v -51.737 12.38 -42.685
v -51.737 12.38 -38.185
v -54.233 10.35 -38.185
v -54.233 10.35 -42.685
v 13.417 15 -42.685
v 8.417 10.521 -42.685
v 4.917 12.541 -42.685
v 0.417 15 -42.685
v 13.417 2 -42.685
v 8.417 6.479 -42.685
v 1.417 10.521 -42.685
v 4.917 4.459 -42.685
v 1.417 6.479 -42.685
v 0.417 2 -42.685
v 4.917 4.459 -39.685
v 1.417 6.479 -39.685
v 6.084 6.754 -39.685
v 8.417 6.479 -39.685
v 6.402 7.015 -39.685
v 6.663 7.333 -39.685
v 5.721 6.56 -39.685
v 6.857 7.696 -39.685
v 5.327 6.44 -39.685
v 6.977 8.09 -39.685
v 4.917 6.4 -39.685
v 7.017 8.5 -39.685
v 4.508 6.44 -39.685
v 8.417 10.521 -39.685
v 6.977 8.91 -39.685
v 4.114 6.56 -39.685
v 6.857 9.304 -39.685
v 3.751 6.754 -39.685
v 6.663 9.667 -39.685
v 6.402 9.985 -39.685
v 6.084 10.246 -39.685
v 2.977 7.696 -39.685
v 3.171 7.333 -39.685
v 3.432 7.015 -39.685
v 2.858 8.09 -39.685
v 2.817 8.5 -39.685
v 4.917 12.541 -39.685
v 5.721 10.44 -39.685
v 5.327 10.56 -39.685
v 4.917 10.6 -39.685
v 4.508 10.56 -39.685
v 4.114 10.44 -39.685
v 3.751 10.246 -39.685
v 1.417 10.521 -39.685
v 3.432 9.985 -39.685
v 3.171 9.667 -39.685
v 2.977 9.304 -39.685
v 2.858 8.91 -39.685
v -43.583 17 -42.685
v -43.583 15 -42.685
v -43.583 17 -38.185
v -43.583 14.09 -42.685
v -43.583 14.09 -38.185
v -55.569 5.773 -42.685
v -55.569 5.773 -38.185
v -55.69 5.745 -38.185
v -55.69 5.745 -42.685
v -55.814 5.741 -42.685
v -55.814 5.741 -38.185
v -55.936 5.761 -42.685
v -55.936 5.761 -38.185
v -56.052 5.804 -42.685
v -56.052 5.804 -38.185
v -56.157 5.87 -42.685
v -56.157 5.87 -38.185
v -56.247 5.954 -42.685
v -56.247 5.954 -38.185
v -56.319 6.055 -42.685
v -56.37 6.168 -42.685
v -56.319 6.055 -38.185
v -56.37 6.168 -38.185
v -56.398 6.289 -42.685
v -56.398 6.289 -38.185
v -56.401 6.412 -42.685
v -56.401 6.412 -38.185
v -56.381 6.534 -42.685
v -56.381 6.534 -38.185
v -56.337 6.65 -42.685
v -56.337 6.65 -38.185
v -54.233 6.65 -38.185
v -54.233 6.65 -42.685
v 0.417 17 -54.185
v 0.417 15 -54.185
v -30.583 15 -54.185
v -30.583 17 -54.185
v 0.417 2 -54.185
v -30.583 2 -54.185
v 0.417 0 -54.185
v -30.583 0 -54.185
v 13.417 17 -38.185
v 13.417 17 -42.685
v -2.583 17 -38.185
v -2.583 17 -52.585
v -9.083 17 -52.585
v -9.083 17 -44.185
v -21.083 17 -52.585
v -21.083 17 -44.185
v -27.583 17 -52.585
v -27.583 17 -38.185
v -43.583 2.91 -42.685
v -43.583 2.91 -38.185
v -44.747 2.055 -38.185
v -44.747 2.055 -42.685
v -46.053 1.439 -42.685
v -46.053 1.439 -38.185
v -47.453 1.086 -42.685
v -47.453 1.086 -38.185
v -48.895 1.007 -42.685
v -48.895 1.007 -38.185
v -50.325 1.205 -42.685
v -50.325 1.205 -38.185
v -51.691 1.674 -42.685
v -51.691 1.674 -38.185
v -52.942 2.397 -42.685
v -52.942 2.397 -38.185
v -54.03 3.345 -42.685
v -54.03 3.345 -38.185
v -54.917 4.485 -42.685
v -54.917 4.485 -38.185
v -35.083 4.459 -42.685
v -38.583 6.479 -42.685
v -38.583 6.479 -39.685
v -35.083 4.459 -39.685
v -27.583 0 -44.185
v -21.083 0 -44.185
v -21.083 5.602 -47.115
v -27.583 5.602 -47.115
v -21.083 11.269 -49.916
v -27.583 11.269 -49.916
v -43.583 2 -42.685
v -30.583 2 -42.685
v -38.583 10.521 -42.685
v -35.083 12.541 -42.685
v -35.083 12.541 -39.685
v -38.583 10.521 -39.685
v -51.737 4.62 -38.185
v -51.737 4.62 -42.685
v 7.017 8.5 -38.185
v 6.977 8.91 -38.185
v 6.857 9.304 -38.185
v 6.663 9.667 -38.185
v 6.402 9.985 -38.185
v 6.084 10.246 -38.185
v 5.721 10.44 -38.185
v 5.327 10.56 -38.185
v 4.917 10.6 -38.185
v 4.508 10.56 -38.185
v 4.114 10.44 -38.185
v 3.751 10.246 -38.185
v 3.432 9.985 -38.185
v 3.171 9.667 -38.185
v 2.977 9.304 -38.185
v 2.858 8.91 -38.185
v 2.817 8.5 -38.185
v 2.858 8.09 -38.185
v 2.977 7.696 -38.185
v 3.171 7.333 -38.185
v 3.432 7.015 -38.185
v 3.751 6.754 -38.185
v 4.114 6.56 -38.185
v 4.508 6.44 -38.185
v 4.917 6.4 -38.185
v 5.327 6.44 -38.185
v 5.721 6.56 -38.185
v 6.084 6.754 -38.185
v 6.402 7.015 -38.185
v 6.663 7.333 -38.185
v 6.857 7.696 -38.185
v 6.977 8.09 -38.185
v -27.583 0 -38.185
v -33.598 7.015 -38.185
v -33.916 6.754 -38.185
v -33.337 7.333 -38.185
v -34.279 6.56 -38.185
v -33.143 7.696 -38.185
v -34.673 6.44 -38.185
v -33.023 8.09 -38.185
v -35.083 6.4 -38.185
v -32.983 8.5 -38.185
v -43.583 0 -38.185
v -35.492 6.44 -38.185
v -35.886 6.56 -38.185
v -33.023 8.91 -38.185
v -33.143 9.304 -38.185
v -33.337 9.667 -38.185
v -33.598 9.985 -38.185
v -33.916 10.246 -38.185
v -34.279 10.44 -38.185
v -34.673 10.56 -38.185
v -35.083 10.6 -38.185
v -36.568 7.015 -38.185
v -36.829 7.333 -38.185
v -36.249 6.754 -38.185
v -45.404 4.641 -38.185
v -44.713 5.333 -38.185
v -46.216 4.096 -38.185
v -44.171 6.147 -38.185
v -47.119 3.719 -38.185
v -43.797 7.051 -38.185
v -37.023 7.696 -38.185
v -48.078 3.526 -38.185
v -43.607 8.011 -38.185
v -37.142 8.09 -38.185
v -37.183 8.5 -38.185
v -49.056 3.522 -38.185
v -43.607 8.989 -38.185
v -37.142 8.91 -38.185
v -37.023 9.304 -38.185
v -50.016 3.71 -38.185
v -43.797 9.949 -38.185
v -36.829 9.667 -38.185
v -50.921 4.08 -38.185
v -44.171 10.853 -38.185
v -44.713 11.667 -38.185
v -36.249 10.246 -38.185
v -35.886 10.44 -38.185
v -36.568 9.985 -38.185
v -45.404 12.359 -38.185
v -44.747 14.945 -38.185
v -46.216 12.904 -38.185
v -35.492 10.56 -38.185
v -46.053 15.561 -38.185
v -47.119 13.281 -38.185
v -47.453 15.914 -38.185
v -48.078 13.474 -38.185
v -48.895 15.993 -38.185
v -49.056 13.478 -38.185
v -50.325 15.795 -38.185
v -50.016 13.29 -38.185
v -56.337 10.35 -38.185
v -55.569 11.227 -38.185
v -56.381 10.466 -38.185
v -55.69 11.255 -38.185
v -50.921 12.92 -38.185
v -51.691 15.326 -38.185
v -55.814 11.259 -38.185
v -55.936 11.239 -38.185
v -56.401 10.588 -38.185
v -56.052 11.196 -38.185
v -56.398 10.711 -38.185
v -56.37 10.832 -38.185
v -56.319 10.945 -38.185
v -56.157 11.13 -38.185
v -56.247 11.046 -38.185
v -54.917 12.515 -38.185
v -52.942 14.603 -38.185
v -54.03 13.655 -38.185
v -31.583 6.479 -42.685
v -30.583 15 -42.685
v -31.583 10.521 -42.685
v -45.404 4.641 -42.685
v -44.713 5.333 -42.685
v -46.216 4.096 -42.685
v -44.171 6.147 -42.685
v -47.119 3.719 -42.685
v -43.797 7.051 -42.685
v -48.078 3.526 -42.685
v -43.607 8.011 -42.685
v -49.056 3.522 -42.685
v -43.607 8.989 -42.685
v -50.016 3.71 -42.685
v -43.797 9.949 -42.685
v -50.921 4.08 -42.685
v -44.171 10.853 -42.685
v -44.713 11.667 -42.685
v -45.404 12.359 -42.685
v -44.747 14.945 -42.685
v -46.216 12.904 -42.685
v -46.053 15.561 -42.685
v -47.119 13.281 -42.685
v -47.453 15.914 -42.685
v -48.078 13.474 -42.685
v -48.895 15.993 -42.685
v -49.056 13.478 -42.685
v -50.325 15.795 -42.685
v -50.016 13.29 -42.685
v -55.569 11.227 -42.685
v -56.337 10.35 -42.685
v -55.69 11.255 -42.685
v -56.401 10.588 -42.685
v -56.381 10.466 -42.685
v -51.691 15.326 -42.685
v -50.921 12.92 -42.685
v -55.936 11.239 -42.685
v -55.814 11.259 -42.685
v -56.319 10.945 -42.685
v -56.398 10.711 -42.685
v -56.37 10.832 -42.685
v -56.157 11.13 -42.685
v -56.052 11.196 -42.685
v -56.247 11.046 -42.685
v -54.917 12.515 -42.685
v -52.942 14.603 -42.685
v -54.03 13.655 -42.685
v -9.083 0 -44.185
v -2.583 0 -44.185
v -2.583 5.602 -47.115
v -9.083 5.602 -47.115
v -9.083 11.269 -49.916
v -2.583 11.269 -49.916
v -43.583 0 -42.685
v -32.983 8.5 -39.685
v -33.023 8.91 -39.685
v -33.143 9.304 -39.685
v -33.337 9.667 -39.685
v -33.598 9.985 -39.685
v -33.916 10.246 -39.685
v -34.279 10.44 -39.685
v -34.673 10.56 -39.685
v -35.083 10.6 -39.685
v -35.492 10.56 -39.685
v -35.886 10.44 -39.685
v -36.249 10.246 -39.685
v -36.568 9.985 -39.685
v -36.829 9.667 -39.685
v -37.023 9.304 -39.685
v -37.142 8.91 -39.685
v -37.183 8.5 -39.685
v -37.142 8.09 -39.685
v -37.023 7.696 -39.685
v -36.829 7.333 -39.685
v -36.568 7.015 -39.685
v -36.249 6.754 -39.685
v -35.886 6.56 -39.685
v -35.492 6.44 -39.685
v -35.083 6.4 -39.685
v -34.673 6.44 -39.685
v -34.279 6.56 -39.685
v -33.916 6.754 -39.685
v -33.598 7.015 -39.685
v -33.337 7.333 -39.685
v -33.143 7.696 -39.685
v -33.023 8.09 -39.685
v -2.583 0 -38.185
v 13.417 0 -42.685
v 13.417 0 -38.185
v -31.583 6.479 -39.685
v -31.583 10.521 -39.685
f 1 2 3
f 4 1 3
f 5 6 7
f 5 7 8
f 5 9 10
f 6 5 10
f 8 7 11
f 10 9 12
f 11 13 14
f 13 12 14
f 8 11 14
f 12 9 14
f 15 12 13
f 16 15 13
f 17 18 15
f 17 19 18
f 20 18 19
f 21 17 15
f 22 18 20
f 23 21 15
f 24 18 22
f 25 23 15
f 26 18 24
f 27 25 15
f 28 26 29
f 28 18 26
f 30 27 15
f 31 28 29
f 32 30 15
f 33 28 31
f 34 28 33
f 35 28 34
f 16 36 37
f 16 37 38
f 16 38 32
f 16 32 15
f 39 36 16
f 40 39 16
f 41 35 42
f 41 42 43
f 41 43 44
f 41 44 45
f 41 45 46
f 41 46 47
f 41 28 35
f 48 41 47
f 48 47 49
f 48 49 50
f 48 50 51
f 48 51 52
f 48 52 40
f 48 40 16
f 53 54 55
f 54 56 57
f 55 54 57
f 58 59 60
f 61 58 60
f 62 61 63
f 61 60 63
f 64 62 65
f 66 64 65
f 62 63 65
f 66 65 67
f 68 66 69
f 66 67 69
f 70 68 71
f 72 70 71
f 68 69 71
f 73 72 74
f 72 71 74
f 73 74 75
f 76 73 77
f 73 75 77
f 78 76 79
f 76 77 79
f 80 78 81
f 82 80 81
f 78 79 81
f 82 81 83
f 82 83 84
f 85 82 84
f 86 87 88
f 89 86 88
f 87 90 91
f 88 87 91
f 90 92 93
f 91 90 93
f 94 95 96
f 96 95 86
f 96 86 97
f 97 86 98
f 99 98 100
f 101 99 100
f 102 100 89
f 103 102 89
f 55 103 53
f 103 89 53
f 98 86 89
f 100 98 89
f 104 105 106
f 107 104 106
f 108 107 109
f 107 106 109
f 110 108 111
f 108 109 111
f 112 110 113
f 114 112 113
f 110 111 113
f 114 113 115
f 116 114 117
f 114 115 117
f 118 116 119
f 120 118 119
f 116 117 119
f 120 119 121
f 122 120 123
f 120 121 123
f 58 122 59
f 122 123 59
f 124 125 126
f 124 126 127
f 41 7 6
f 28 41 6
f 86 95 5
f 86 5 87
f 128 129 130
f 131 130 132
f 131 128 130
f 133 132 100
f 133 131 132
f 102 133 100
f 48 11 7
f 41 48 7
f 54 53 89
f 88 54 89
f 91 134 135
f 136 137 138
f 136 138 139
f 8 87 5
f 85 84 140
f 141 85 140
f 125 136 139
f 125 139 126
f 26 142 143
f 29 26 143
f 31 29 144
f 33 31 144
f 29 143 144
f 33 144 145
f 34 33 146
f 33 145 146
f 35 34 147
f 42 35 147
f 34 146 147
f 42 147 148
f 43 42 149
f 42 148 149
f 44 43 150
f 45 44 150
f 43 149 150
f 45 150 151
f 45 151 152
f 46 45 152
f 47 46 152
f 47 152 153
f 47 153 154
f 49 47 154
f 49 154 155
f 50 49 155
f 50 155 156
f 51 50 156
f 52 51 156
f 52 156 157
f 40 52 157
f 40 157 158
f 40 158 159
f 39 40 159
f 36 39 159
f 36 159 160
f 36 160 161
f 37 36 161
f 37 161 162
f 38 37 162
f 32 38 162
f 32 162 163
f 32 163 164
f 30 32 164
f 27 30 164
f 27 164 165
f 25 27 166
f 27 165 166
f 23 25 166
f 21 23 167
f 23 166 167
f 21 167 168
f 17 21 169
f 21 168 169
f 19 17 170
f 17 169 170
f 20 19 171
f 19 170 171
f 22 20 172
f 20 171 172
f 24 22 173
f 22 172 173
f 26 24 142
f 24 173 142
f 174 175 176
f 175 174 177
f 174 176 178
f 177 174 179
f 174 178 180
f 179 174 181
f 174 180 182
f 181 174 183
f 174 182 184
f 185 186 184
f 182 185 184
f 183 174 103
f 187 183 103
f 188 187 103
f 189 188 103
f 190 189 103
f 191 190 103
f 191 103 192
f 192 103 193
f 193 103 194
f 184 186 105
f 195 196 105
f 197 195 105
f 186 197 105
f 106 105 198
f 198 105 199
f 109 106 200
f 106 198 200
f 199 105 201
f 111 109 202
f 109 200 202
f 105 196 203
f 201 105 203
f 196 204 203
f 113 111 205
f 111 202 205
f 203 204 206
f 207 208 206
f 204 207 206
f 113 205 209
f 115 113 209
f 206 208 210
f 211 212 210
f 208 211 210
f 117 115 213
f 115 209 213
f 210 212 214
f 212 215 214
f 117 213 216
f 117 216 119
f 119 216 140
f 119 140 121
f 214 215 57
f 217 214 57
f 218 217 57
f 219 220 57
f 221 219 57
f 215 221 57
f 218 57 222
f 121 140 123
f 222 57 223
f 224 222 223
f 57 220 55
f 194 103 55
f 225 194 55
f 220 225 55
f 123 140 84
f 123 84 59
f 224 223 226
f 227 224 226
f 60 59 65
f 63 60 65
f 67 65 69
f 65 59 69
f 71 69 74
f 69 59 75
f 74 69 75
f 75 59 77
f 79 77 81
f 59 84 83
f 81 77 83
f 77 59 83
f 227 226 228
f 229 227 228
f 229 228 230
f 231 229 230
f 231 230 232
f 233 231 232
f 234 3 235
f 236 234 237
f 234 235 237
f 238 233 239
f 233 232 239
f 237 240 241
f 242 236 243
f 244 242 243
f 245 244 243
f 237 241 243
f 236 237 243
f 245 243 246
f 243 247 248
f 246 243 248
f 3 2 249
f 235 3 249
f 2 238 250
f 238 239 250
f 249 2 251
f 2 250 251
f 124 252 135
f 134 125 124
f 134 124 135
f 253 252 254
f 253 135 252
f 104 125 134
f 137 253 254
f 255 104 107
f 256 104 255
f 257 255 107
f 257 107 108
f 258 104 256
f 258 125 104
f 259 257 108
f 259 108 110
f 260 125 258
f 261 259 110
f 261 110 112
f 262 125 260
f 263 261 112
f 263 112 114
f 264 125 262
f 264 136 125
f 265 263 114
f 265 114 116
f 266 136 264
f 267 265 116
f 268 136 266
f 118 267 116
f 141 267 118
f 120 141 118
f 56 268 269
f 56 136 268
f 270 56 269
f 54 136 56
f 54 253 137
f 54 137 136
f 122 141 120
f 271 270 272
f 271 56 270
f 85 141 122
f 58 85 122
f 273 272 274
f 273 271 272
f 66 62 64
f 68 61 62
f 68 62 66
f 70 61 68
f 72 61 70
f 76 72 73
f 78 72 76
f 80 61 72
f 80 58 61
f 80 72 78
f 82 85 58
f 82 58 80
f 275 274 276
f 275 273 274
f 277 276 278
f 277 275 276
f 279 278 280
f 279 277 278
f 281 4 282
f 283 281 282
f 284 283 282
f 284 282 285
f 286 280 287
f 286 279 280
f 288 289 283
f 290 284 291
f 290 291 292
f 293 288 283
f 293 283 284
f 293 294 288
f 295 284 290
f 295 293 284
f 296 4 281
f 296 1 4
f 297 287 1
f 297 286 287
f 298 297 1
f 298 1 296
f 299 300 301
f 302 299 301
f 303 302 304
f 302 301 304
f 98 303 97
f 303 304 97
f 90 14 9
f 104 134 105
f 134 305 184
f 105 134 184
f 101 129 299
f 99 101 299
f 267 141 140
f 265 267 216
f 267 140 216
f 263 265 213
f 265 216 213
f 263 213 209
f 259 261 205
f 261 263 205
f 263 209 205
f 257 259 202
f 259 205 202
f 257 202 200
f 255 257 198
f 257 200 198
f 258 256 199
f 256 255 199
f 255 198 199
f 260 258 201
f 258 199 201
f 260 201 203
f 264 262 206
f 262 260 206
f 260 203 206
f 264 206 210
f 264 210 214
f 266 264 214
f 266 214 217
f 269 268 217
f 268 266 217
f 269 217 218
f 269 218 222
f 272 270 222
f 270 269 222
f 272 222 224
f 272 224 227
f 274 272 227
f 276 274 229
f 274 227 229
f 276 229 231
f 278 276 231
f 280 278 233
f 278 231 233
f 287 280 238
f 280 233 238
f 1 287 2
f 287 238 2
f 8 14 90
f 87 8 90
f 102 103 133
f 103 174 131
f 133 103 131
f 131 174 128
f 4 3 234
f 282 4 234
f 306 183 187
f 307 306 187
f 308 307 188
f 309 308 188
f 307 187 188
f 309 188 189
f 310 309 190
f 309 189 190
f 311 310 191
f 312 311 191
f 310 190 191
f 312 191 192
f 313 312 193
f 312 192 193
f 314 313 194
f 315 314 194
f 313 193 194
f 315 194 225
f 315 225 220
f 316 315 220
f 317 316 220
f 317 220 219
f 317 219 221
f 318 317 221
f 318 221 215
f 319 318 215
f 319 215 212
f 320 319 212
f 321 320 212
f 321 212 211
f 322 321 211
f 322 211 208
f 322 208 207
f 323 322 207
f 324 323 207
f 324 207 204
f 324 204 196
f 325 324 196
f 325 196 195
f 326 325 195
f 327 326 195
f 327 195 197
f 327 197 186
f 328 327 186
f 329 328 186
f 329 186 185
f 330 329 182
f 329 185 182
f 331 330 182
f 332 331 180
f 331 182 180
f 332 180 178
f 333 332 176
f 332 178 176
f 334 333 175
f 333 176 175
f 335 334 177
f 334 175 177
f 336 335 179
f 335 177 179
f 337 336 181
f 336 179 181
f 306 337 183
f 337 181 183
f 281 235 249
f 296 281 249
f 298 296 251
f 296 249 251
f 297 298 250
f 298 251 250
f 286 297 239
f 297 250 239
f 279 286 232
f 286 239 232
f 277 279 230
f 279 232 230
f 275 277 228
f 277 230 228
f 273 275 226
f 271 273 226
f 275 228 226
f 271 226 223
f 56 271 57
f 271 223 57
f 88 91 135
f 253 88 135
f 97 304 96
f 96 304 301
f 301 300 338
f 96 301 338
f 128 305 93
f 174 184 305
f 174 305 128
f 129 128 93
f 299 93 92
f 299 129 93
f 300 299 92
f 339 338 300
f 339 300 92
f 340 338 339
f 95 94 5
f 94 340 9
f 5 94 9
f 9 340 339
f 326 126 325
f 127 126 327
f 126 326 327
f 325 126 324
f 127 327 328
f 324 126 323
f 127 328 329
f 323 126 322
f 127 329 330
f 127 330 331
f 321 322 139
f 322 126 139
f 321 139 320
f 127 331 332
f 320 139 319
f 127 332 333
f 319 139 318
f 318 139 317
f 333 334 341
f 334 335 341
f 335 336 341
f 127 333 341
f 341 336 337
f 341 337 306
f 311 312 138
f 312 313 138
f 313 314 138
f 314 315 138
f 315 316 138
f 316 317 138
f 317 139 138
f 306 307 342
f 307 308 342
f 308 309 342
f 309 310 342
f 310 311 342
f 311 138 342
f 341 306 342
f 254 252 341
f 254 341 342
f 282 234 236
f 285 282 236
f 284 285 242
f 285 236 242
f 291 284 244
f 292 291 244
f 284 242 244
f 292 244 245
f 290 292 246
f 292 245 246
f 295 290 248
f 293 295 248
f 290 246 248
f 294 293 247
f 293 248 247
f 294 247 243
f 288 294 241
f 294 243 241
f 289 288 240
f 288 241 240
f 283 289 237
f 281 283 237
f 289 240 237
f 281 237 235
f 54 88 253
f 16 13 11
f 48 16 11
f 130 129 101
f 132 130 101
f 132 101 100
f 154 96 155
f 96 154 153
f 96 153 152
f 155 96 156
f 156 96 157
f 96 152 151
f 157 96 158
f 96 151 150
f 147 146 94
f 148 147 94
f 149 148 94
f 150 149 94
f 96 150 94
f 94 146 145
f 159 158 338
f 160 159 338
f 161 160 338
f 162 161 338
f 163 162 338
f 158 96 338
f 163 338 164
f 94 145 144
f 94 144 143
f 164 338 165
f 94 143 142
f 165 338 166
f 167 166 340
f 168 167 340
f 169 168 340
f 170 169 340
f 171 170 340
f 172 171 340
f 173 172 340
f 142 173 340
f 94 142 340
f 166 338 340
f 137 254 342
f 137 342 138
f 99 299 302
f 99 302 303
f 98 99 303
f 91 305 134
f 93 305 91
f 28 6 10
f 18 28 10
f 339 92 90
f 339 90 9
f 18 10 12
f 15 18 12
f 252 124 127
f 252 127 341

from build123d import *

# Parameters (mm, degrees)
BOSS_EXTRUDE1_DEPTH = 17
BOSS_EXTRUDE2_DEPTH = 2
BOSS_EXTRUDE3_DEPTH = 2
SKETCH4_R           = 2.1
CUT_EXTRUDE1_DEPTH  = 100
CUT_EXTRUDE2_DEPTH  = 3
CUT_EXTRUDE3_DEPTH  = 6.5
CUT_EXTRUDE4_DEPTH  = 6.5
BOSS_EXTRUDE4_DEPTH = 4.5


with BuildPart() as part:
    # Sketch1 → Boss-Extrude1 (new body)
    with BuildSketch(Plane(origin=(0, 0, 0), x_dir=(1, 0, 0), z_dir=(0, 1, 0))):
        Polygon((-27.582659514, 44.185105583), (-2.582659514, 44.185105583), (-2.582659514, 38.185105583), (13.417340486, 38.185105583), (13.417340486, 42.685105583), (0.417340486, 42.685105583), (0.417340486, 54.185105583), (-30.582659514, 54.185105583), (-30.582659514, 42.685105583), (-43.582659514, 42.685105583), (-43.582659514, 38.185105583), (-27.582659514, 38.185105583), align=None)
    extrude(amount=BOSS_EXTRUDE1_DEPTH)

    # Sketch2 → Boss-Extrude2 (add)
    with BuildSketch(Plane(origin=(0, 17, 0), x_dir=(1, 0, 0), z_dir=(0, 1, 0))):
        Polygon((-43.582659514, 42.685105583), (-30.582659514, 54.185105583), (-30.582659514, 42.685105583), align=None)
        Polygon((0.417340486, 42.685105583), (13.417340486, 42.685105583), (0.417340486, 54.185105583), align=None)
    extrude(amount=-BOSS_EXTRUDE2_DEPTH)

    # Sketch3 → Boss-Extrude3 (add)
    with BuildSketch(Plane.XZ):
        Polygon((-43.582659514, -42.685105583), (-30.582659514, -54.185105583), (-30.582659514, -42.685105583), align=None)
        Polygon((0.417340486, -42.685105583), (0.417340486, -54.185105583), (13.417340486, -42.685105583), align=None)
    extrude(amount=-BOSS_EXTRUDE3_DEPTH)

    # Sketch4 → Cut-Extrude1 (cut)
    with BuildSketch(Plane.XY.offset(-38.185105583)):
        with Locations((-35.082659514, 8.5)):
            Circle(SKETCH4_R)
        with Locations((4.917340486, 8.5)):
            Circle(SKETCH4_R)
    extrude(amount=-CUT_EXTRUDE1_DEPTH, mode=Mode.SUBTRACT)

    # Sketch5 → Cut-Extrude2 (cut)
    with BuildSketch(Plane(origin=(0, 0, -42.685105583), x_dir=(-1, 0, 0), z_dir=(0, 0, -1))):
        Polygon((31.582659514, 6.479274058), (31.582659514, 10.520725942), (35.082659514, 12.541451884), (38.582659514, 10.520725942), (38.582659514, 6.479274058), (35.082659514, 4.458548116), align=None)
        Polygon((-1.417340486, 10.520725942), (-4.917340486, 12.541451884), (-8.417340486, 10.520725942), (-8.417340486, 6.479274058), (-4.917340486, 4.458548116), (-1.417340486, 6.479274058), align=None)
    extrude(amount=-CUT_EXTRUDE2_DEPTH, mode=Mode.SUBTRACT)

    # Sketch7 → Cut-Extrude3 (cut)
    with BuildSketch(Plane.ZY.offset(2.582659514)):
        with BuildLine():
            Line((-53.601964627, 19.27795803), (-35.36636136, 18.147314128))
            Line((-35.36636136, 18.147314128), (-35.36636136, -6.291096758))
            Line((-35.36636136, -6.291096758), (-39.347618514, -8.620327672))
            ThreePointArc((-39.347618514, -8.620327672), (-46.872397507, 5.125662458), (-53.601964627, 19.27795803))
        make_face()
    extrude(amount=CUT_EXTRUDE3_DEPTH, mode=Mode.SUBTRACT)

    # Sketch8 → Cut-Extrude4 (cut)
    with BuildSketch(Plane(origin=(-27.582659514, 0, 0), x_dir=(0, 0, -1), z_dir=(1, 0, 0))):
        with BuildLine():
            Line((60.133248532, 35.4590838), (29.94533861, 35.4590838))
            Line((29.94533861, 35.4590838), (34.196090785, -17.072827801))
            ThreePointArc((34.196090785, -17.072827801), (48.567589168, 8.50044914), (60.133248532, 35.4590838))
        make_face()
    extrude(amount=CUT_EXTRUDE4_DEPTH, mode=Mode.SUBTRACT)

    # Sketch9 → Boss-Extrude4 (add)
    with BuildSketch(Plane.XY.offset(-38.185105583)):
        with BuildLine():
            Line((-51.736745863, 12.379657112), (-54.233308347, 10.35))
            Line((-54.233308347, 10.35), (-56.336651381, 10.35))
            ThreePointArc((-56.336651381, 10.35), (-56.247164307, 11.045699168), (-55.569469191, 11.226626221))
            ThreePointArc((-55.569469191, 11.226626221), (-41.082659514, 8.5), (-55.569469191, 5.773373779))
            ThreePointArc((-55.569469191, 5.773373779), (-56.247164307, 5.954300832), (-56.336651381, 6.65))
            Line((-56.336651381, 6.65), (-54.233308347, 6.65))
            Line((-54.233308347, 6.65), (-51.736745863, 4.620342888))
            ThreePointArc((-51.736745863, 4.620342888), (-43.582659514, 8.5), (-51.736745863, 12.379657112))
        make_face()
    extrude(amount=-BOSS_EXTRUDE4_DEPTH)


solid = part.part
